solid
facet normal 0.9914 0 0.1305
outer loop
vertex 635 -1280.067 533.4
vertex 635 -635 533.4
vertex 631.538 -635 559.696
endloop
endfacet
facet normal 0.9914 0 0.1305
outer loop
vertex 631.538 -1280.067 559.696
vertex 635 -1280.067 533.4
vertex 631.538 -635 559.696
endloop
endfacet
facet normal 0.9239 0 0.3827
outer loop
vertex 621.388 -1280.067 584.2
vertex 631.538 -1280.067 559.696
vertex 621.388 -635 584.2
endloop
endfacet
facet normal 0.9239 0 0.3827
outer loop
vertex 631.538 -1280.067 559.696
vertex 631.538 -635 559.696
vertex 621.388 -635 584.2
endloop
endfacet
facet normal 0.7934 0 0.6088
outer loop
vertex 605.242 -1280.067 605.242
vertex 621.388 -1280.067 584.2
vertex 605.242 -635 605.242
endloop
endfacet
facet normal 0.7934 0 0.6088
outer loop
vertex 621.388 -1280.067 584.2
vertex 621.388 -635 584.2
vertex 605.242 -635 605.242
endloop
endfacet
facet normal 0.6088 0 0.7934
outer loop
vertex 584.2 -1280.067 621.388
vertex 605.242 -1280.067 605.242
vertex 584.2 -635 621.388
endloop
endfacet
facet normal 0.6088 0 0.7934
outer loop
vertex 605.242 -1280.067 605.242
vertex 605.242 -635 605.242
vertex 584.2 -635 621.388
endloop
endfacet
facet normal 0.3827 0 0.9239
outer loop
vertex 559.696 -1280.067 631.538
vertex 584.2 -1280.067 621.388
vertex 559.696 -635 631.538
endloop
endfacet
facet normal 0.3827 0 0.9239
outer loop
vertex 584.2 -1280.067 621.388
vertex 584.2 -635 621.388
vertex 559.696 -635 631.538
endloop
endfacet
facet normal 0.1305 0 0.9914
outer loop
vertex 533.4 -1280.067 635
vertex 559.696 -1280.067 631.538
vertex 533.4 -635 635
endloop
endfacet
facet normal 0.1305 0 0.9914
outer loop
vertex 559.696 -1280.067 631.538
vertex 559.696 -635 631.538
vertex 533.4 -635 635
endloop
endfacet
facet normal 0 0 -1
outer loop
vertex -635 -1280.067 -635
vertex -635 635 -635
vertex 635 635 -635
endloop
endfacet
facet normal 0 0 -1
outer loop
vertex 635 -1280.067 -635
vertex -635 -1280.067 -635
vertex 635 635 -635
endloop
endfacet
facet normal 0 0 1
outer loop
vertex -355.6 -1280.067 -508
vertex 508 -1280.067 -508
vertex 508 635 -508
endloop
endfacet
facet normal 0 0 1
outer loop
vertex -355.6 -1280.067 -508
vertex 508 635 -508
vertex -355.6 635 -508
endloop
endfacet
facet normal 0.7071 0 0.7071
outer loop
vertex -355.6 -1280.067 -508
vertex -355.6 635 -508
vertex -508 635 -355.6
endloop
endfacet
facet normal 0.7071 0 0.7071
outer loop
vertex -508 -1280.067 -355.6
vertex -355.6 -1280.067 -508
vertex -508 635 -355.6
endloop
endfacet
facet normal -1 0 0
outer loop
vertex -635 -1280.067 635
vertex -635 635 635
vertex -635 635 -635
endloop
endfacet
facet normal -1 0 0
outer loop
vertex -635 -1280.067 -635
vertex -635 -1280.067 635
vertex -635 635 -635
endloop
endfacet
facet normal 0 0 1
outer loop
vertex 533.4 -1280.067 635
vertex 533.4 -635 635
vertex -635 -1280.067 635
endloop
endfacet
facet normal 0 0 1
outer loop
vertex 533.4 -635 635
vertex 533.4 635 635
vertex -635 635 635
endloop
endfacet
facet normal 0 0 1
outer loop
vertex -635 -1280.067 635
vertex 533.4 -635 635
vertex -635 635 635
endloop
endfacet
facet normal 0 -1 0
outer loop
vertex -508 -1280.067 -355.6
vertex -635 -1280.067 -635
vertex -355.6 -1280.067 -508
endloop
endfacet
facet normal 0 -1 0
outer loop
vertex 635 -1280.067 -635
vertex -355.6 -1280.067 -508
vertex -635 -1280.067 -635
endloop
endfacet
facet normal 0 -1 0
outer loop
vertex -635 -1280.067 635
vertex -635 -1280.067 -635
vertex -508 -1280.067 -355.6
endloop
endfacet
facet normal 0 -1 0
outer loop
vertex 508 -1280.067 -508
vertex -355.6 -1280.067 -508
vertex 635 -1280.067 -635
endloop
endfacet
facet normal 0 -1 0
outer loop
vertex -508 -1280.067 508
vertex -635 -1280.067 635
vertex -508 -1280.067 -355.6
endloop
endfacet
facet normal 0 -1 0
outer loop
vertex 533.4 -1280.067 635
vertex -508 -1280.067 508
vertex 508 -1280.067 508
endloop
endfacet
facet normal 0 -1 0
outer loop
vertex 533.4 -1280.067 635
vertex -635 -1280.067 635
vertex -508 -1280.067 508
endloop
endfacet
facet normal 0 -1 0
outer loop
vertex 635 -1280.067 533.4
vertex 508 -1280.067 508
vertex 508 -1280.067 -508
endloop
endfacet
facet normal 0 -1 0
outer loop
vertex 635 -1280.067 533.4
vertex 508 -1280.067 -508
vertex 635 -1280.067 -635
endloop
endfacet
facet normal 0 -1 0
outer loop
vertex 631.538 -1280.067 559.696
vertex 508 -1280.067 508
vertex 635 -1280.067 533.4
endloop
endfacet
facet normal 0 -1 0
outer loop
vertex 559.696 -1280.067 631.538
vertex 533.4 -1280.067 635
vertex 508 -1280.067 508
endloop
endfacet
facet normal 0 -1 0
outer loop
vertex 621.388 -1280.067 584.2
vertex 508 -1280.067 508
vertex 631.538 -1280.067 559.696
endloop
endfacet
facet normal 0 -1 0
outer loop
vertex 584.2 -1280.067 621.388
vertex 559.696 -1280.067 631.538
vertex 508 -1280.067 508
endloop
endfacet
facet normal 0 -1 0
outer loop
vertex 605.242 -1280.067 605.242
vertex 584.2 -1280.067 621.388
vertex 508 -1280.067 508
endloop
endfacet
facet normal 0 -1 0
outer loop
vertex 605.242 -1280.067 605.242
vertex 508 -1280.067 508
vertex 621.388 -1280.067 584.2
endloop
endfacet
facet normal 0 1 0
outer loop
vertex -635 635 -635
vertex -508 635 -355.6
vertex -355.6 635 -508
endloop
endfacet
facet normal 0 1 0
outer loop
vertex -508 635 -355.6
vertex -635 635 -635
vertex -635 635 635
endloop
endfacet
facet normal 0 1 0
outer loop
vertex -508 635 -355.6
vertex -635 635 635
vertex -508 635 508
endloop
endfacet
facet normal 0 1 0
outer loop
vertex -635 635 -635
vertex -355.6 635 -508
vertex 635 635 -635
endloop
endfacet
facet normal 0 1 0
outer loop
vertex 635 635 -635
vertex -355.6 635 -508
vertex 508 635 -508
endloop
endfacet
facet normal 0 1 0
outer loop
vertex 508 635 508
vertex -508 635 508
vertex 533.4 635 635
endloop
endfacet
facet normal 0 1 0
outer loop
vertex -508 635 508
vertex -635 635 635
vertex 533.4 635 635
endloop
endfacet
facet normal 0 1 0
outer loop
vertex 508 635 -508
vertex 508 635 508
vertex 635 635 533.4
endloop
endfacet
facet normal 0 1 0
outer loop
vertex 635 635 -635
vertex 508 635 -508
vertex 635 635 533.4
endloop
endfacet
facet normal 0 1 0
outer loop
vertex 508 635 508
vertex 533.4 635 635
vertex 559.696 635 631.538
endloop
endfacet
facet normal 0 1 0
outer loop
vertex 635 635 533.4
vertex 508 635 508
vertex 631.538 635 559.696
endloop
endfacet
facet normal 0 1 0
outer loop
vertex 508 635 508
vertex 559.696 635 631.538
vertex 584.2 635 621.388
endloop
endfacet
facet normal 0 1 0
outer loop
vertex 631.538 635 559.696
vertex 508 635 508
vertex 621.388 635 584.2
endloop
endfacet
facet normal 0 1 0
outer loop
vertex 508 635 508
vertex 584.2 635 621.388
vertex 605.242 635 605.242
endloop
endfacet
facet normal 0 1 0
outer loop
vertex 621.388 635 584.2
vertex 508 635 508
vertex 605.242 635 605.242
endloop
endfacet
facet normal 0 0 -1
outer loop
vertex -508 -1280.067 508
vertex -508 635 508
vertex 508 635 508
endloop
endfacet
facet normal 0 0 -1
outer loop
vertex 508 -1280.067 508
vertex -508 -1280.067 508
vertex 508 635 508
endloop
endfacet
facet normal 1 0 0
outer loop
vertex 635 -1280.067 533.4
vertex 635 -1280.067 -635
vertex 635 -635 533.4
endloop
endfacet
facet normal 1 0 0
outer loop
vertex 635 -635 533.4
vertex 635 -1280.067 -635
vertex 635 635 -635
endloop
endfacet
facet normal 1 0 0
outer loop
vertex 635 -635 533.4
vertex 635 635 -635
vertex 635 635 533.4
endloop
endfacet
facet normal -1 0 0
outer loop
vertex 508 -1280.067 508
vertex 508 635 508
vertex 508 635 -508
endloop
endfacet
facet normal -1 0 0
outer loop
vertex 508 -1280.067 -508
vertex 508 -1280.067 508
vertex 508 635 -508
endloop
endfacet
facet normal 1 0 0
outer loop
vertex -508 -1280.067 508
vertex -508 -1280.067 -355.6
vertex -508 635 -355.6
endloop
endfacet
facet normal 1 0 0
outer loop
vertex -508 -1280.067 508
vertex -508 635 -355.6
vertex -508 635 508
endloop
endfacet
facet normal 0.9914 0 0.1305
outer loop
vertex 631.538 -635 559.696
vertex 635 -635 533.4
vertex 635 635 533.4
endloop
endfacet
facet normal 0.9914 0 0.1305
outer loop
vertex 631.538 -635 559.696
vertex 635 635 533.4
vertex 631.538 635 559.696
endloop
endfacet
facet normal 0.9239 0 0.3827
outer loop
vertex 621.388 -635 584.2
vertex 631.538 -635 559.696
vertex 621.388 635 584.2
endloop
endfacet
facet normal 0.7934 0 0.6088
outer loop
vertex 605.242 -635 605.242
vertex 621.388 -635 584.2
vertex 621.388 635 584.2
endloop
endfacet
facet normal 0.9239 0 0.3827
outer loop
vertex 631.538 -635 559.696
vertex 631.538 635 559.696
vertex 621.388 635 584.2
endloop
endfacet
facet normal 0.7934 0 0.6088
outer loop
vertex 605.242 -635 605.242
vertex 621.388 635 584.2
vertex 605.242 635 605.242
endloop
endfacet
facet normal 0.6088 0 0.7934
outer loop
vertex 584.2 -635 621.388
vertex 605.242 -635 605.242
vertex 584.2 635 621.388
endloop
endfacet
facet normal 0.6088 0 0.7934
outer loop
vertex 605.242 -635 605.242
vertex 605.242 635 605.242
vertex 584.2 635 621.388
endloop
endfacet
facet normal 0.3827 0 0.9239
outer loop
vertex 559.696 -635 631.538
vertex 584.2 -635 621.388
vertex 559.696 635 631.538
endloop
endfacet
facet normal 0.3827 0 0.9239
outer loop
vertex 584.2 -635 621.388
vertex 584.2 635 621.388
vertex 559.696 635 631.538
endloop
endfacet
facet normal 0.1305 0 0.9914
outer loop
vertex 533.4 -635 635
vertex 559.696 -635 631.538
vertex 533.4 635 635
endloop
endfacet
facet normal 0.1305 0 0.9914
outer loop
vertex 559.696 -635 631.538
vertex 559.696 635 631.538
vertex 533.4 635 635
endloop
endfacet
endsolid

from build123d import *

# Parameters (mm, degrees)
F0_W     = 1270
F0_H     = 1270
F0_W_2   = 1016
F0_H_2   = 1016
F1_DEPTH = 635
F2_R     = 101.6
F3_SIZE  = 152.4
F4_DEPTH = 645.067396


with BuildPart() as f1:
    # F0 (on Front) → F1 (new body, symmetric)
    with BuildSketch(Plane.XZ):
        Rectangle(F0_W, F0_H)
        Rectangle(F0_W_2, F0_H_2, mode=Mode.SUBTRACT)
    extrude(amount=F1_DEPTH, both=True)

    # F2
    f2_edges = [f1.edges().sort_by_distance(p)[0] for p in [
        (635, 0, 635),
    ]]
    fillet(f2_edges, radius=F2_R)

    # F3
    f3_edges = [f1.edges().sort_by_distance(p)[0] for p in [
        (-508, 0, -508),
    ]]
    chamfer(f3_edges, length=F3_SIZE)

    # F1_face (on face) → F4 (join)
    with BuildSketch(Plane(origin=(-11.297191, -635, -11.297191), x_dir=(1, 0, 0), z_dir=(0, -1, 0))):
        with BuildLine():
            Line((646.297191, -623.702809), (646.297191, 544.697191))
            ThreePointArc((646.297191, 544.697191), (616.53924, 616.53924), (544.697191, 646.297191))
            Line((544.697191, 646.297191), (-623.702809, 646.297191))
            Line((-623.702809, 646.297191), (-623.702809, -623.702809))
            Line((-623.702809, -623.702809), (646.297191, -623.702809))
        make_face()
        Polygon((519.297191, -496.702809), (-344.302809, -496.702809), (-496.702809, -344.302809), (-496.702809, 519.297191), (519.297191, 519.297191), align=None, mode=Mode.SUBTRACT)
    extrude(amount=F4_DEPTH)


solid = f1.part
